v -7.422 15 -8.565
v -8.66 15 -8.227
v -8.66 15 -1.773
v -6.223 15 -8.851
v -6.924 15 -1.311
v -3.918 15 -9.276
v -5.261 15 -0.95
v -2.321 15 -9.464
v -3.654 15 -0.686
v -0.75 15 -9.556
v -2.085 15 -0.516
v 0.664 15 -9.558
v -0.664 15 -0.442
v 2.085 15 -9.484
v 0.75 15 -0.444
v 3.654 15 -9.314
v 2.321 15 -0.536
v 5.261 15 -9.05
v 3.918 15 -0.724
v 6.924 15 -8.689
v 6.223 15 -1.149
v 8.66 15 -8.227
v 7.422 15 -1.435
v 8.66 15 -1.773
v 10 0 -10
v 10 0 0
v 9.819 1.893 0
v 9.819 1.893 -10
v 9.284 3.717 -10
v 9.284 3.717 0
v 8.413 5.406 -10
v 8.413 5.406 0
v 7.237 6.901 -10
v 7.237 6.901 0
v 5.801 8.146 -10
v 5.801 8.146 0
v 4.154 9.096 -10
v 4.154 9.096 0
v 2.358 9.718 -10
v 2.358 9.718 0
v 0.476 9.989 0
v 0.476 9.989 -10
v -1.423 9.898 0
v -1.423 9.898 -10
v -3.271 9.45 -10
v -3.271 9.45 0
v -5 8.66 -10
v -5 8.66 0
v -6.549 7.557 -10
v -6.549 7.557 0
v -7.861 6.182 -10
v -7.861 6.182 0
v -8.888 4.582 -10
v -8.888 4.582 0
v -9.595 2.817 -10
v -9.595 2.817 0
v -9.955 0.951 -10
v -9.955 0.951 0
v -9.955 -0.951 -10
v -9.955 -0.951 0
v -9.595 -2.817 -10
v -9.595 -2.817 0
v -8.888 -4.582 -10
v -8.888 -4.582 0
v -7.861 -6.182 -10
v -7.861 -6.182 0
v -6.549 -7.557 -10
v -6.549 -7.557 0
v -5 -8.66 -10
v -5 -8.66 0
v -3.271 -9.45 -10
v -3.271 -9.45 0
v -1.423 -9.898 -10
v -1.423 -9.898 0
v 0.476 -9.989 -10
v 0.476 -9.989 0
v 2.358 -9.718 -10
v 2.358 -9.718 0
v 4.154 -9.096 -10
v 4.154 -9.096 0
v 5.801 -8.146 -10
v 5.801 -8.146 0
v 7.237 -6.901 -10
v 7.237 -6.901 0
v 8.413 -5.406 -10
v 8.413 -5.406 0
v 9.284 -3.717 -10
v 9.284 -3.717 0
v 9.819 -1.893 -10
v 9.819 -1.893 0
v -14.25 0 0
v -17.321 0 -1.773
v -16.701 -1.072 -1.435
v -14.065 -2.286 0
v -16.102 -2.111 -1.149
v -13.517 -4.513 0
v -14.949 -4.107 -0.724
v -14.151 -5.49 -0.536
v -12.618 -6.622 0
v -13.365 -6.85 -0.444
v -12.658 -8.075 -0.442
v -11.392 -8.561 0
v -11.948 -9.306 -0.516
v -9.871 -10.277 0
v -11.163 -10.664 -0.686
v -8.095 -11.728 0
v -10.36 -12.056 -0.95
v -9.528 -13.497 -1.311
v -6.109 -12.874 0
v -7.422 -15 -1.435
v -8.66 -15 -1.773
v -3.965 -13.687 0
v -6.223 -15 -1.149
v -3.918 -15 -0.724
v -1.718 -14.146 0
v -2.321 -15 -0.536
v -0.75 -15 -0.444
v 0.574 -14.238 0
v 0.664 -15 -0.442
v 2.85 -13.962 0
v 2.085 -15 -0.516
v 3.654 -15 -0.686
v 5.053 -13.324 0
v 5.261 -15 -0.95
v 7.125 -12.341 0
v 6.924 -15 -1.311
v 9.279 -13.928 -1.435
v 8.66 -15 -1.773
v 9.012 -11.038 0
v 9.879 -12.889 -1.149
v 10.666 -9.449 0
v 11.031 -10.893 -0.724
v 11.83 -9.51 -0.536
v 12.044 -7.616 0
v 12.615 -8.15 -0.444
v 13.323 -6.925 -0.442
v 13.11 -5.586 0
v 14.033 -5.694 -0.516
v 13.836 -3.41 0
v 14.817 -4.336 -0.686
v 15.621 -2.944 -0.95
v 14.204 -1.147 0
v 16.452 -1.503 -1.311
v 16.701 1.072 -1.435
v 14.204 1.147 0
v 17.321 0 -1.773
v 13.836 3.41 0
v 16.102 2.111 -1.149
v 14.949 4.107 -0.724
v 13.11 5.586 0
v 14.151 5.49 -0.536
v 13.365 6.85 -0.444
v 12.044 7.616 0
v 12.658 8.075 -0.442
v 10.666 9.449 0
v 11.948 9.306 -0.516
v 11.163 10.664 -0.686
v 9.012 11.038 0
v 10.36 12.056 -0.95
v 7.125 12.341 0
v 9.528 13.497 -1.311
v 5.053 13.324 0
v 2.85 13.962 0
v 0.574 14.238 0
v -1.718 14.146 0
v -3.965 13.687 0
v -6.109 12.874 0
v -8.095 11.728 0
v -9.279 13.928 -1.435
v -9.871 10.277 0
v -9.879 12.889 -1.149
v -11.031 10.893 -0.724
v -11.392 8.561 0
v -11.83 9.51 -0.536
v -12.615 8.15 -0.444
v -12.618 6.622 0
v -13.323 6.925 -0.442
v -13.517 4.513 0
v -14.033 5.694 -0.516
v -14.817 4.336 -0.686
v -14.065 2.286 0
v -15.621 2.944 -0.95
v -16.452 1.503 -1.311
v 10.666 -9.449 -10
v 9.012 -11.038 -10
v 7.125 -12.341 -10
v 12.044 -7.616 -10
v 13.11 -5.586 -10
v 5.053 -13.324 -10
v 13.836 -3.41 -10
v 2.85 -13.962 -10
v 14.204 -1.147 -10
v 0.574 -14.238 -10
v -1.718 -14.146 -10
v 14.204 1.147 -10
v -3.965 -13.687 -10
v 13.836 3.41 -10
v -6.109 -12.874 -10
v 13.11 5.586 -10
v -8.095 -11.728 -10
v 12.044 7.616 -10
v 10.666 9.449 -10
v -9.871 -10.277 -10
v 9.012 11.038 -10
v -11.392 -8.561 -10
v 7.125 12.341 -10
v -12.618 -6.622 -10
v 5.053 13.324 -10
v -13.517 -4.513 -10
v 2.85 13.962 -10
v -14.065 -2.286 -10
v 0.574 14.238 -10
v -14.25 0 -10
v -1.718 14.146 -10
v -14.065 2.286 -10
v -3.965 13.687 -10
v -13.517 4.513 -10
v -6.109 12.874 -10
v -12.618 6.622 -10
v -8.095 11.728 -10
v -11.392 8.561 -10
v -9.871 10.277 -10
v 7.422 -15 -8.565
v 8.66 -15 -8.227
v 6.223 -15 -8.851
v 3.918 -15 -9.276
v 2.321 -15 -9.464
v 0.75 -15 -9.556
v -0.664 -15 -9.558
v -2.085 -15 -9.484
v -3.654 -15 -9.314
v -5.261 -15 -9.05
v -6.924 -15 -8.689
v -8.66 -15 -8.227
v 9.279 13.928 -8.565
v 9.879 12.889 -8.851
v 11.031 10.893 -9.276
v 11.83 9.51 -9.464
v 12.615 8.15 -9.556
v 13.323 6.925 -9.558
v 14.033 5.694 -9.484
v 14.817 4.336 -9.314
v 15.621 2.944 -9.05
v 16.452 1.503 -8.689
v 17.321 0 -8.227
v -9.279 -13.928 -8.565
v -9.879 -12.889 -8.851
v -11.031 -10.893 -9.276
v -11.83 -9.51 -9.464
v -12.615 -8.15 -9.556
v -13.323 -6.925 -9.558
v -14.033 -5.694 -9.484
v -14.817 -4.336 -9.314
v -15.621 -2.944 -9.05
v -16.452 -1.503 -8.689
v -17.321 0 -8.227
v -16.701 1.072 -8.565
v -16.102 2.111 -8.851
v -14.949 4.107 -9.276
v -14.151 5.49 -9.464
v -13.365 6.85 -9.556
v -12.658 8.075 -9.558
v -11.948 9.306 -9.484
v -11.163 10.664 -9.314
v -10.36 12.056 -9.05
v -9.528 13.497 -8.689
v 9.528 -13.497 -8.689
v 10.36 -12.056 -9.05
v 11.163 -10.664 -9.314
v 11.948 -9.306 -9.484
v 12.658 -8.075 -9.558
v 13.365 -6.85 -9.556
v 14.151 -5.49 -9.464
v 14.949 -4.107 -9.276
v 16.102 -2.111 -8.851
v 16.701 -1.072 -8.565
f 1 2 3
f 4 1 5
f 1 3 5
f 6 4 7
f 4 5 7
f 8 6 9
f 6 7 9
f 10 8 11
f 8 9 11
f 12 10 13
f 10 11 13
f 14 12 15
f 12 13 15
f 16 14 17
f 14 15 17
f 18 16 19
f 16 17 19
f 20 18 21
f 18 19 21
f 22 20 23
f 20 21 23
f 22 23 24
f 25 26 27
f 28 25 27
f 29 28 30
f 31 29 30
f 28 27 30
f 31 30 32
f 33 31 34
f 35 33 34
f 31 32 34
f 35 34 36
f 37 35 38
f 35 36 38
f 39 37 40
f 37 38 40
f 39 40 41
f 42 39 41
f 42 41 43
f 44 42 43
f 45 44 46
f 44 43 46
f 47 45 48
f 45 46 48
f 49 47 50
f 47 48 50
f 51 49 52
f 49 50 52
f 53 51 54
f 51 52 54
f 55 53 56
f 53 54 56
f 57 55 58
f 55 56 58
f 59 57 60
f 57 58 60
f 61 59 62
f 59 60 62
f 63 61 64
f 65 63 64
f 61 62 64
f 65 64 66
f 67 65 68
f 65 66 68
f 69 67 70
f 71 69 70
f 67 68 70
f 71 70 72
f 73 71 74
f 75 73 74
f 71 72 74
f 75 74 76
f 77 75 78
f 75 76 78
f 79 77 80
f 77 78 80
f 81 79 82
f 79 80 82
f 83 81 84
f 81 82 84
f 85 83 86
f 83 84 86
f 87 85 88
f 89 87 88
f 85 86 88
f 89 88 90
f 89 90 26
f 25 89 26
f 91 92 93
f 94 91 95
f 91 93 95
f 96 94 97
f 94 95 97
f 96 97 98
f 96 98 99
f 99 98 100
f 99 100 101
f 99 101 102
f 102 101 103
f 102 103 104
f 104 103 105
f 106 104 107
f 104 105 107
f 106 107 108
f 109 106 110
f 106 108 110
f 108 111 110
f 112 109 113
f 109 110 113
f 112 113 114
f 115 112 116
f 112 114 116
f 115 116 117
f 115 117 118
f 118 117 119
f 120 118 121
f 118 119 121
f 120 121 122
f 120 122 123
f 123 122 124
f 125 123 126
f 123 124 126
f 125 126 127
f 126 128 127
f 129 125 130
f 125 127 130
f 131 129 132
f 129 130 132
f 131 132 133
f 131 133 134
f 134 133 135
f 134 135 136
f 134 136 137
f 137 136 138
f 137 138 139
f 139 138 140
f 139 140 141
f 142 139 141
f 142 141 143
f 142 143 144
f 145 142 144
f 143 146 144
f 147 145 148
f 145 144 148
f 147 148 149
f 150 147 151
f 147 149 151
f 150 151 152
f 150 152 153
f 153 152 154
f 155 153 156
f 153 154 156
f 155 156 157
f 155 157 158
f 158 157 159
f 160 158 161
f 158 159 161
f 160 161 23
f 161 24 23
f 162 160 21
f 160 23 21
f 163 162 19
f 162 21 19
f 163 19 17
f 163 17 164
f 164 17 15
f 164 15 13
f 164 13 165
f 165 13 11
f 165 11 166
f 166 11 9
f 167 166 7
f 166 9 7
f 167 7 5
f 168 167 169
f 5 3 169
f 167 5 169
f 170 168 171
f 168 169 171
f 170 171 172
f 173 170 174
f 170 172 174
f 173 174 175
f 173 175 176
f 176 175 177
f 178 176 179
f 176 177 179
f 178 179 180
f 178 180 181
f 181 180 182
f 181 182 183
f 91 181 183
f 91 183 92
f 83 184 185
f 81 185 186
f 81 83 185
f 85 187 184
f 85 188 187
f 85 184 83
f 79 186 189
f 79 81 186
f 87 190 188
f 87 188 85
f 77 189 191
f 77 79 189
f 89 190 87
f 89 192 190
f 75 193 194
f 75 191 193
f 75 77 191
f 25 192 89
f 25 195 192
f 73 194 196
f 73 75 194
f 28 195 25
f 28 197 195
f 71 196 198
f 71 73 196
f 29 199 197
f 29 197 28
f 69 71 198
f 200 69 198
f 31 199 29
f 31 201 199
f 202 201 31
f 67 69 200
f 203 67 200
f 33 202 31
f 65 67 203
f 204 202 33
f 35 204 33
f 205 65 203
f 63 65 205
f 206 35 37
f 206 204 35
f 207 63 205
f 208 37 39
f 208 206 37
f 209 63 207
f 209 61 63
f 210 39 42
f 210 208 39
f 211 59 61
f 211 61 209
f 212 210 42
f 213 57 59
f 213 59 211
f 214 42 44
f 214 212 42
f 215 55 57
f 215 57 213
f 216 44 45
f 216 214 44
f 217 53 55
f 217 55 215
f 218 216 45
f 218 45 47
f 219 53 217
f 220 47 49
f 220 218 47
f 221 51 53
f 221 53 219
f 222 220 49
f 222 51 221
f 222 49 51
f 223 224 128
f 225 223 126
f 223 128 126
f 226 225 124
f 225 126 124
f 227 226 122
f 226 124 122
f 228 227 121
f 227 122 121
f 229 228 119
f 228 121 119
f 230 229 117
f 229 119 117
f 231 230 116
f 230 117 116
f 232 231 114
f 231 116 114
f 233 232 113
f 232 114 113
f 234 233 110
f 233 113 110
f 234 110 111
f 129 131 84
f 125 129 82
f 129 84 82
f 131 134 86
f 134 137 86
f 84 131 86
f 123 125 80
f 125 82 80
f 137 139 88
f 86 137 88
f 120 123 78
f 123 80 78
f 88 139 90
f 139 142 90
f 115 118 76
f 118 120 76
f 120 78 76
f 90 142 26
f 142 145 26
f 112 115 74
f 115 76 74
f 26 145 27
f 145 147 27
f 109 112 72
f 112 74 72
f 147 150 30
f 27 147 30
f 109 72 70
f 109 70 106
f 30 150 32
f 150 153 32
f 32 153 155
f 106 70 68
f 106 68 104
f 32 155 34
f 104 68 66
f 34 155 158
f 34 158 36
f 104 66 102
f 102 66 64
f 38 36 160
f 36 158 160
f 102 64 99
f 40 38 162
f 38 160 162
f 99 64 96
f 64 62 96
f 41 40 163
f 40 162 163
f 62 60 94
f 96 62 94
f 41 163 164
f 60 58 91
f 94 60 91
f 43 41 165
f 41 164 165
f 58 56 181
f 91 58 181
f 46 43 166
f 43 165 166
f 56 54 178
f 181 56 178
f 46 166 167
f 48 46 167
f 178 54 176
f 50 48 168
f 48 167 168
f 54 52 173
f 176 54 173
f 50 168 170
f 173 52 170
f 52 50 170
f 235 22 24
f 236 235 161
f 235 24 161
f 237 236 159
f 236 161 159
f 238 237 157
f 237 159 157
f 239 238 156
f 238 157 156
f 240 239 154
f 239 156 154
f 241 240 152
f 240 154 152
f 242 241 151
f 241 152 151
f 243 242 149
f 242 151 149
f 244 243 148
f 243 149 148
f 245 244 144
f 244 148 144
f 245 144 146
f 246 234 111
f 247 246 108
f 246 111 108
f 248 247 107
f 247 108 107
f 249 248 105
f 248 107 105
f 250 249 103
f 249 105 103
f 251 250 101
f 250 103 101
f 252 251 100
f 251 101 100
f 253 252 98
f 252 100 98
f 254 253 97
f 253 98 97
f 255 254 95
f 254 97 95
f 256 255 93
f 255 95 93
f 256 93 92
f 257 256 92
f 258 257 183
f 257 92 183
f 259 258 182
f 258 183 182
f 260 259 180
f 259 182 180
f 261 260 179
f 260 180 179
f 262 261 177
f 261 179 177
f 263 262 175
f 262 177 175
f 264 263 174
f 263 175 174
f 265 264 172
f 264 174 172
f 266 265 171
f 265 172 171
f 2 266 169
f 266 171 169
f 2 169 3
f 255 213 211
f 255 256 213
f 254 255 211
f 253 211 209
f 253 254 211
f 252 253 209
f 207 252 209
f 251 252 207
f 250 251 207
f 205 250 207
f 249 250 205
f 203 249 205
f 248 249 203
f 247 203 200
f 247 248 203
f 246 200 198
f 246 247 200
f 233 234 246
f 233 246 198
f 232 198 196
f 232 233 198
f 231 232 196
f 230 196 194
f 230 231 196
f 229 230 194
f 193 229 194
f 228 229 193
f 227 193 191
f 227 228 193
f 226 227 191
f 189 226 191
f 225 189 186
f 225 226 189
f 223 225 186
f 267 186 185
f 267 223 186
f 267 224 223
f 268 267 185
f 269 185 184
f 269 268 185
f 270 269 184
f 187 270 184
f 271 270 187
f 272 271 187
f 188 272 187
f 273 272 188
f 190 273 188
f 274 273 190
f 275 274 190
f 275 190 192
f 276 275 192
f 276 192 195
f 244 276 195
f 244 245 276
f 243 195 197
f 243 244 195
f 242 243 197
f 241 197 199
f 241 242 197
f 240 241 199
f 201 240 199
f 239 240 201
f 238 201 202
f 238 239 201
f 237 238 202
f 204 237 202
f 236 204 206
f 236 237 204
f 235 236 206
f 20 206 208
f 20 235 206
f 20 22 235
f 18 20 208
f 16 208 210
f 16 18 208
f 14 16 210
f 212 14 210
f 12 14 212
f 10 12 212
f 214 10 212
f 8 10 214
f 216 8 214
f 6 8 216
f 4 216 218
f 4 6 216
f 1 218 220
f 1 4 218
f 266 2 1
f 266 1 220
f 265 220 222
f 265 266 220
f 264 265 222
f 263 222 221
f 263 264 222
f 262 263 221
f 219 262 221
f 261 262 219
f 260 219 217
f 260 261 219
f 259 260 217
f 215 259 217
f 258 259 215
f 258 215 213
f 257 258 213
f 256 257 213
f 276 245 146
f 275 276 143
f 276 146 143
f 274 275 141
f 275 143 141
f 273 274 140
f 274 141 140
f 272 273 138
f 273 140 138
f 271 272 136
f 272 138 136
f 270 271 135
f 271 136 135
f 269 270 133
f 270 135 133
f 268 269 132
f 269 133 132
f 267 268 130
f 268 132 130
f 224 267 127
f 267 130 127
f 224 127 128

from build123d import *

# Parameters (mm, degrees)
BASENUTSKE_R       = 10
BASENUT_DEPTH      = 10
SKETCH6_OUTSIDE_W  = 84.128
SKETCH6_OUTSIDE_H  = 79.486
SKETCH6_OUTSIDE_R  = 14.25
CUT_EXTRUDE2_DEPTH = 11
CUT_EXTRUDE2_TAPER = 60


with BuildPart() as part:
    # BaseNutSke → BaseNut (new body)
    with BuildSketch(Plane.XY):
        Polygon((8.660254038, -15), (-8.660254038, -15), (-17.320508076, 0), (-8.660254038, 15), (8.660254038, 15), (17.320508076, 0), align=None)
        Circle(BASENUTSKE_R, mode=Mode.SUBTRACT)
    extrude(amount=-BASENUT_DEPTH)

    # Sketch6 outside → Cut-Extrude2 (cut, through all)
    with BuildSketch(Plane(origin=(0, 0, -10), x_dir=(-1, 0, 0), z_dir=(0, 0, -1))):
        Rectangle(SKETCH6_OUTSIDE_W, SKETCH6_OUTSIDE_H)
        Circle(SKETCH6_OUTSIDE_R, mode=Mode.SUBTRACT)
    cut_extrude2 = extrude(amount=-CUT_EXTRUDE2_DEPTH, taper=CUT_EXTRUDE2_TAPER, mode=Mode.SUBTRACT)

    # Mirror1: Cut-Extrude2 across plane
    add(cut_extrude2.mirror(Plane(origin=(0, 0, -5), x_dir=(1, 0, 0), z_dir=(0, 0, -1))), mode=Mode.SUBTRACT)


solid = part.part
